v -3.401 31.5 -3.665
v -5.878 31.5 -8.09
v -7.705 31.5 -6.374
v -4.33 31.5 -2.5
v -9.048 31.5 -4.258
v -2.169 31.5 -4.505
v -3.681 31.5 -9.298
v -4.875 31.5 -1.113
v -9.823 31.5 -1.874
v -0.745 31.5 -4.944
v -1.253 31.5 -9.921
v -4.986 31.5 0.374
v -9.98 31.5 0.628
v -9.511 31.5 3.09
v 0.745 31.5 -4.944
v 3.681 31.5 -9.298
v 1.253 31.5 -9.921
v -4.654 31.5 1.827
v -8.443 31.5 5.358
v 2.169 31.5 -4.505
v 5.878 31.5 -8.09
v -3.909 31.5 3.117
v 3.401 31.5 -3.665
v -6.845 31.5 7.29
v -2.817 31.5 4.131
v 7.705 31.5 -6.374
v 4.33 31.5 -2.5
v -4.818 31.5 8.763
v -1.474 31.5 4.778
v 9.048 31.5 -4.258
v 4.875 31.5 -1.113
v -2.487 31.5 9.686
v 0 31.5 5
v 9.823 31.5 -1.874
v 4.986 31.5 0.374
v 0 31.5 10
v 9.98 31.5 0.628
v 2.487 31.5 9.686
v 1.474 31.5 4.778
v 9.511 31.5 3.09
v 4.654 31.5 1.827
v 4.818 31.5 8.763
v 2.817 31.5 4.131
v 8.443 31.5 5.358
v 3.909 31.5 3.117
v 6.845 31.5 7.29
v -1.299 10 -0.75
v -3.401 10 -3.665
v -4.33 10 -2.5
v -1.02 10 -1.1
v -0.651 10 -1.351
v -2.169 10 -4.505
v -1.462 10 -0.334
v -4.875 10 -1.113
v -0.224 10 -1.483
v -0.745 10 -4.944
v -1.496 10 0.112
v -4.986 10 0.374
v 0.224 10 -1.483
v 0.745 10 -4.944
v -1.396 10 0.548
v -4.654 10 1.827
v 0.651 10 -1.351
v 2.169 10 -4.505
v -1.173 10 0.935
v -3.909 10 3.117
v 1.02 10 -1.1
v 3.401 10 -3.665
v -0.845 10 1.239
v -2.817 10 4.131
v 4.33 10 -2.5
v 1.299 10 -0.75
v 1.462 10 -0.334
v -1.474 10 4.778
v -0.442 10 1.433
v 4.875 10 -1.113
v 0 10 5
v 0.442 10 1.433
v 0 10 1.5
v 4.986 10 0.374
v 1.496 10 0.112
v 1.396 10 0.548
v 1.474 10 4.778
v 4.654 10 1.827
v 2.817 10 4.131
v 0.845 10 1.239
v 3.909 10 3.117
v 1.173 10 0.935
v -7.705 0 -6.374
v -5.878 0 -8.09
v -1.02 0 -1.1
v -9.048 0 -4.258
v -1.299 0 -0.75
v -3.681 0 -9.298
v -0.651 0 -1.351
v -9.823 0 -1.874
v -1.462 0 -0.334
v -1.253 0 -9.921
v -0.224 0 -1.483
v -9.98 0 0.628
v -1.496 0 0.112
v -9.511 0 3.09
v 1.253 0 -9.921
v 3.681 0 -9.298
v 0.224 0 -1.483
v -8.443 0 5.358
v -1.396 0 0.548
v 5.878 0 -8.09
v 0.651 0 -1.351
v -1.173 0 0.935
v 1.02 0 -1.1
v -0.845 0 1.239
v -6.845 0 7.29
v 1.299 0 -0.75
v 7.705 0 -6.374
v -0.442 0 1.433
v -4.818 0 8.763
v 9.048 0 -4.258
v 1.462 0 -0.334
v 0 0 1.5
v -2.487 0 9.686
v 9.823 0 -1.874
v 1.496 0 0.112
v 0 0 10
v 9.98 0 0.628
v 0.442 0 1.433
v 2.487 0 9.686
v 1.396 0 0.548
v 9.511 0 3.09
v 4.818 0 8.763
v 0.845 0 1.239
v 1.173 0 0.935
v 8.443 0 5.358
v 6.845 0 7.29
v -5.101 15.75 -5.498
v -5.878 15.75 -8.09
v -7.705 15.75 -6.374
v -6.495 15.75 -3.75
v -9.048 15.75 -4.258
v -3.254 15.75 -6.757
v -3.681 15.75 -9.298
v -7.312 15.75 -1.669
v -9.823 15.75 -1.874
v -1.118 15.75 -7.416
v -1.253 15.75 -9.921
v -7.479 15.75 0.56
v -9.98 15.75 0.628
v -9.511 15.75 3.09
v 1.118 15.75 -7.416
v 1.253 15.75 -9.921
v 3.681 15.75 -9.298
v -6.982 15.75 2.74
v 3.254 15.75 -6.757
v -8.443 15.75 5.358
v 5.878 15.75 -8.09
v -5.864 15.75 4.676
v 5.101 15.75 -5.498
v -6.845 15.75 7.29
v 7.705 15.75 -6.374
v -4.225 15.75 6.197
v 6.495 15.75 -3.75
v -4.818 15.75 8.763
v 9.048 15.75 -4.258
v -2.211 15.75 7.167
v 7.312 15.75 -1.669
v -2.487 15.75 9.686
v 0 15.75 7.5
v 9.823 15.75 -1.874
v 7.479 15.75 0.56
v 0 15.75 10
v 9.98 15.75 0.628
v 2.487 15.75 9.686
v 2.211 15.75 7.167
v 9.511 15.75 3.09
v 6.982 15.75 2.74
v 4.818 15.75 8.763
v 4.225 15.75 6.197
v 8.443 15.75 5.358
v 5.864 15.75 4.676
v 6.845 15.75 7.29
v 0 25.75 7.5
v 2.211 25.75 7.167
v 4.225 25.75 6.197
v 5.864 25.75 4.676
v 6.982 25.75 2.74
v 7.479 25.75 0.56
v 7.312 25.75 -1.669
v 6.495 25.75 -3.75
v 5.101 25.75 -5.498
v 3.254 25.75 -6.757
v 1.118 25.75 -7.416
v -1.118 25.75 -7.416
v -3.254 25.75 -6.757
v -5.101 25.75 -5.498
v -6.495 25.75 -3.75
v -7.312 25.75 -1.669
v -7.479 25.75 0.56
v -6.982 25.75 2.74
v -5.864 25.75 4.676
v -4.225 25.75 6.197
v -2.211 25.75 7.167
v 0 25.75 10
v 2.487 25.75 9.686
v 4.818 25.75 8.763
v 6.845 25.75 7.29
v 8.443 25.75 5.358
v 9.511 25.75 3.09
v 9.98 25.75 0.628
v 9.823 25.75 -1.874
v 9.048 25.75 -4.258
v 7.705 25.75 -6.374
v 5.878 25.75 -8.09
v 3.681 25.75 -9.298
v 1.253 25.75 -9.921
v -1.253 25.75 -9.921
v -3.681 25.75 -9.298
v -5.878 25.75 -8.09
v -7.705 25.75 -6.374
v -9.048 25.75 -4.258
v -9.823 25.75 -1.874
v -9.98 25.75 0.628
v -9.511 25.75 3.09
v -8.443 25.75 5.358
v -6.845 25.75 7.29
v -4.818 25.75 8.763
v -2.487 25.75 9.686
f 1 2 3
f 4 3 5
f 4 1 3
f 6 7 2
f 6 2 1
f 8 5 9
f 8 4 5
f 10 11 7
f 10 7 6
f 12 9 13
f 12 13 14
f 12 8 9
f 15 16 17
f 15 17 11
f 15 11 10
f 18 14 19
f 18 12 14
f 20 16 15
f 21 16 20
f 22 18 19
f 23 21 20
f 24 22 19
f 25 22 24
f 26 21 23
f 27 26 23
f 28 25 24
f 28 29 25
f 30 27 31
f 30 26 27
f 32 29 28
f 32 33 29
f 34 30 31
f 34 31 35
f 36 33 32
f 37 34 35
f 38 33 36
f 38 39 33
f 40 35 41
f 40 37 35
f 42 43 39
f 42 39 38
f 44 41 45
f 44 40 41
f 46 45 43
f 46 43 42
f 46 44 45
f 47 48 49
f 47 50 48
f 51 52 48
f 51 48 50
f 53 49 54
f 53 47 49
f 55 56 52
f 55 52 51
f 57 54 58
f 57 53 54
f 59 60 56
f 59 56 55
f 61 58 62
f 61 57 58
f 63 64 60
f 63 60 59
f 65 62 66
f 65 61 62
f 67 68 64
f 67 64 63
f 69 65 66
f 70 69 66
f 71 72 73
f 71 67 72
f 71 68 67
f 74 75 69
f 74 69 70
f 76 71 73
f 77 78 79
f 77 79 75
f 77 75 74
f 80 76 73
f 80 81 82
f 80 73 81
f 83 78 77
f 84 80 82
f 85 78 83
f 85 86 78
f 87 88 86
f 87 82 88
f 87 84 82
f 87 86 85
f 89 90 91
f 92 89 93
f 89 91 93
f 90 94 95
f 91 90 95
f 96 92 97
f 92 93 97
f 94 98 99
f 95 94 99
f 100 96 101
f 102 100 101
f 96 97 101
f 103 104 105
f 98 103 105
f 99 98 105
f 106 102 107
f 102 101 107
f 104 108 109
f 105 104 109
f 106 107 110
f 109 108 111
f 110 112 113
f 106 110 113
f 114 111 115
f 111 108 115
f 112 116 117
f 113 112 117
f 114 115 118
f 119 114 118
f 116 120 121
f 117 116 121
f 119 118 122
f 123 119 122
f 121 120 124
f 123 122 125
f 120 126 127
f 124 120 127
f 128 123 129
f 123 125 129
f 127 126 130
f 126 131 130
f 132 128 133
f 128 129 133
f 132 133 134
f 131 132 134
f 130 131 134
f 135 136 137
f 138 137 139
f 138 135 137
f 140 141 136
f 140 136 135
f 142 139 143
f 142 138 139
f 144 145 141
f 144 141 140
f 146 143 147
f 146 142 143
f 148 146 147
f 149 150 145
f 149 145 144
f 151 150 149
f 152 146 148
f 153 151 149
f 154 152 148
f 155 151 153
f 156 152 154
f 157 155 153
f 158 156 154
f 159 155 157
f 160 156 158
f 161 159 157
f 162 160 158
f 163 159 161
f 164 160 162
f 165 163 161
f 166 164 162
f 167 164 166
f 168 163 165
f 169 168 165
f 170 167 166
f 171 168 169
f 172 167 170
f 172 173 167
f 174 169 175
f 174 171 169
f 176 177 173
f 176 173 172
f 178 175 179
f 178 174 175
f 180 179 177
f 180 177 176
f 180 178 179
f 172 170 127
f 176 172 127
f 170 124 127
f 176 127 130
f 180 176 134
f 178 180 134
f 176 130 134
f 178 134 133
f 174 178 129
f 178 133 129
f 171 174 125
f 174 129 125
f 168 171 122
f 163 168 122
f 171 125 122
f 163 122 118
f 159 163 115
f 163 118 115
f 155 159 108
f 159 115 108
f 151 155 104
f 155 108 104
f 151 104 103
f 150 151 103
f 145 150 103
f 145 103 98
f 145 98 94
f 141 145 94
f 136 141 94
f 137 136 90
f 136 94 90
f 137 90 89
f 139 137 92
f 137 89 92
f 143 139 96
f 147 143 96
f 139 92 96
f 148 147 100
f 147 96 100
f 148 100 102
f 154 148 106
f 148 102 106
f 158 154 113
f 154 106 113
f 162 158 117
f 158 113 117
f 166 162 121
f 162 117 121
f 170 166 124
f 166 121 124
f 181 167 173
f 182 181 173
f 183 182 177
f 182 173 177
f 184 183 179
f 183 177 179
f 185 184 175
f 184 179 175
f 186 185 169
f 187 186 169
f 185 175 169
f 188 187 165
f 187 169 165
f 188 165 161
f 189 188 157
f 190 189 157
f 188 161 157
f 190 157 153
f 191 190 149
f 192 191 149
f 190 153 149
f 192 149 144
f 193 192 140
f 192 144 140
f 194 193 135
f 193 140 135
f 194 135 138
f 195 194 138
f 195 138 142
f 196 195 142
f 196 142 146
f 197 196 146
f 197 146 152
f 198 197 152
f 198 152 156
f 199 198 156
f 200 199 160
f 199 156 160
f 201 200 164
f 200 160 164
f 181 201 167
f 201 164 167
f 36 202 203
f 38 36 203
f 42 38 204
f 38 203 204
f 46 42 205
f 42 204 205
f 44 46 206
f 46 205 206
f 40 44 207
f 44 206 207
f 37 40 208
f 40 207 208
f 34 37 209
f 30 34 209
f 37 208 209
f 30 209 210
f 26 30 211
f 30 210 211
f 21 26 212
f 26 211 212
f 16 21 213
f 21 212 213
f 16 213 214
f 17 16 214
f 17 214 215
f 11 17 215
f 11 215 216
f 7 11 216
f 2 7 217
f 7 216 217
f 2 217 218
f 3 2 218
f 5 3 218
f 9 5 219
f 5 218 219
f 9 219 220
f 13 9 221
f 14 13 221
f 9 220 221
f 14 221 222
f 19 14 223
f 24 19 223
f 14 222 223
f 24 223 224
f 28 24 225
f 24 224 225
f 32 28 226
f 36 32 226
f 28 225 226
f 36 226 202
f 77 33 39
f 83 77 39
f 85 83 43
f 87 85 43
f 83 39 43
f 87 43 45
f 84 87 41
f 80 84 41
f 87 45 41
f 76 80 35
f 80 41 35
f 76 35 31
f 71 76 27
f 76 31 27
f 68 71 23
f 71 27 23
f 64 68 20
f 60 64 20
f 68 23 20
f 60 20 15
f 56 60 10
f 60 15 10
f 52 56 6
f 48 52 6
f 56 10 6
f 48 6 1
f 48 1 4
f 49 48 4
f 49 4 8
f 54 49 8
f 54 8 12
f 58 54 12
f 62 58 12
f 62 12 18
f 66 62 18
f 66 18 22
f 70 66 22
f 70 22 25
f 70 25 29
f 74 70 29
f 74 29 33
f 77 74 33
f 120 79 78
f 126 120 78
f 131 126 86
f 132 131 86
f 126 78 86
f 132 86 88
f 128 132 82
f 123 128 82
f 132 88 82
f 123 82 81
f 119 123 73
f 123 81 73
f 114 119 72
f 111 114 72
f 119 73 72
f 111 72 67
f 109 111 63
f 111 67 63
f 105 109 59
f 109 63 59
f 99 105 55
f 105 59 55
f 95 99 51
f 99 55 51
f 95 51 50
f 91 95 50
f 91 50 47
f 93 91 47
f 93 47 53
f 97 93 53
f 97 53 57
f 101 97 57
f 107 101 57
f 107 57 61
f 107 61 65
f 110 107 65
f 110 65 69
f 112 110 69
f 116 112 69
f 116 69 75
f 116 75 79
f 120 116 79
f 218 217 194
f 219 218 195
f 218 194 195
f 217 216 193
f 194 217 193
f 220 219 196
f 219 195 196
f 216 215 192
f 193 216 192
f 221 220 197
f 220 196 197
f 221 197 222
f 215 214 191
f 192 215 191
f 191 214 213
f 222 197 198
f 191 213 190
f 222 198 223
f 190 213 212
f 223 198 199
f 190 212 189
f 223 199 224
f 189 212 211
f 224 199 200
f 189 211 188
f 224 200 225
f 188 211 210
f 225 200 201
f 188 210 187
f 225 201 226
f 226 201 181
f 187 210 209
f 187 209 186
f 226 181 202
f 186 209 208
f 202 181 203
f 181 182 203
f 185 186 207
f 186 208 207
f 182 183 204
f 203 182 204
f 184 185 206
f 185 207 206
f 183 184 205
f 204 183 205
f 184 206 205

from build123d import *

# Parameters (mm, degrees)
SKETCH1_R           = 10
BOSS_EXTRUDE2_DEPTH = 10
CUT_EXTRUDE3_REACH  = 19.321
SKETCH5_R           = 1.5
SKETCH6_R           = 10
BOSS_EXTRUDE3_DEPTH = 5.75
SKETCH7_R           = 5
CUT_EXTRUDE4_DEPTH  = 5.75
SKETCH8_R           = 7.5
BOSS_EXTRUDE4_DEPTH = 10
SKETCH9_R           = 10
BOSS_EXTRUDE5_DEPTH = 5.75
CUT_EXTRUDE5_REACH  = 36.529
SKETCH10_R          = 5


with BuildPart() as part:
    # Sketch1 → Boss-Extrude2 (new body)
    with BuildSketch(Plane(origin=(0, 0, 0), x_dir=(1, 0, 0), z_dir=(0, 1, 0))):
        with Locations(Location((0, 0, 0), (0, 0, 270))):
            Circle(SKETCH1_R)
    extrude(amount=BOSS_EXTRUDE2_DEPTH)

    # Sketch5 → Cut-Extrude3 (cut, up to next)
    with BuildSketch(Plane(origin=(0, 10, 0), x_dir=(-1, 0, 0), z_dir=(0, 1, 0)), mode=Mode.PRIVATE) as cut_extrude3_sk1:
        with Locations(Location((0, 0, 0), (0, 0, 90))):
            Circle(SKETCH5_R)
    cut_extrude3_tool1 = extrude(cut_extrude3_sk1.sketch, amount=-CUT_EXTRUDE3_REACH, mode=Mode.PRIVATE) & part.part
    add(cut_extrude3_tool1.solids().sort_by_distance((0, 10, 0))[0], mode=Mode.SUBTRACT)

    # Sketch6 → Boss-Extrude3 (add)
    with BuildSketch(Plane(origin=(0, 10, 0), x_dir=(-1, 0, 0), z_dir=(0, 1, 0))):
        with Locations(Location((0, 0, 0), (0, 0, 90))):
            Circle(SKETCH6_R)
    extrude(amount=BOSS_EXTRUDE3_DEPTH)

    # Sketch7 → Cut-Extrude4 (cut)
    with BuildSketch(Plane(origin=(0, 15.75, 0), x_dir=(-1, 0, 0), z_dir=(0, 1, 0))):
        with Locations(Location((0, 0, 0), (0, 0, 90))):
            Circle(SKETCH7_R)
    extrude(amount=-CUT_EXTRUDE4_DEPTH, mode=Mode.SUBTRACT)

    # Sketch8 → Boss-Extrude4 (add)
    with BuildSketch(Plane(origin=(0, 15.75, 0), x_dir=(-1, 0, 0), z_dir=(0, 1, 0))):
        with Locations(Location((0, 0, 0), (0, 0, 90))):
            Circle(SKETCH8_R)
    extrude(amount=BOSS_EXTRUDE4_DEPTH)

    # Sketch9 → Boss-Extrude5 (add)
    with BuildSketch(Plane(origin=(0, 25.75, 0), x_dir=(-1, 0, 0), z_dir=(0, 1, 0))):
        with Locations(Location((0, 0, 0), (0, 0, 90))):
            Circle(SKETCH9_R)
    extrude(amount=BOSS_EXTRUDE5_DEPTH)

    # Sketch10 → Cut-Extrude5 (cut, up to next)
    with BuildSketch(Plane(origin=(0, 31.5, 0), x_dir=(-1, 0, 0), z_dir=(0, 1, 0)), mode=Mode.PRIVATE) as cut_extrude5_sk1:
        with Locations(Location((0, 0, 0), (0, 0, 90))):
            Circle(SKETCH10_R)
    cut_extrude5_tool1 = extrude(cut_extrude5_sk1.sketch, amount=-CUT_EXTRUDE5_REACH, mode=Mode.PRIVATE) & part.part
    add(cut_extrude5_tool1.solids().sort_by_distance((0, 31.5, 0))[0], mode=Mode.SUBTRACT)


solid = part.part
